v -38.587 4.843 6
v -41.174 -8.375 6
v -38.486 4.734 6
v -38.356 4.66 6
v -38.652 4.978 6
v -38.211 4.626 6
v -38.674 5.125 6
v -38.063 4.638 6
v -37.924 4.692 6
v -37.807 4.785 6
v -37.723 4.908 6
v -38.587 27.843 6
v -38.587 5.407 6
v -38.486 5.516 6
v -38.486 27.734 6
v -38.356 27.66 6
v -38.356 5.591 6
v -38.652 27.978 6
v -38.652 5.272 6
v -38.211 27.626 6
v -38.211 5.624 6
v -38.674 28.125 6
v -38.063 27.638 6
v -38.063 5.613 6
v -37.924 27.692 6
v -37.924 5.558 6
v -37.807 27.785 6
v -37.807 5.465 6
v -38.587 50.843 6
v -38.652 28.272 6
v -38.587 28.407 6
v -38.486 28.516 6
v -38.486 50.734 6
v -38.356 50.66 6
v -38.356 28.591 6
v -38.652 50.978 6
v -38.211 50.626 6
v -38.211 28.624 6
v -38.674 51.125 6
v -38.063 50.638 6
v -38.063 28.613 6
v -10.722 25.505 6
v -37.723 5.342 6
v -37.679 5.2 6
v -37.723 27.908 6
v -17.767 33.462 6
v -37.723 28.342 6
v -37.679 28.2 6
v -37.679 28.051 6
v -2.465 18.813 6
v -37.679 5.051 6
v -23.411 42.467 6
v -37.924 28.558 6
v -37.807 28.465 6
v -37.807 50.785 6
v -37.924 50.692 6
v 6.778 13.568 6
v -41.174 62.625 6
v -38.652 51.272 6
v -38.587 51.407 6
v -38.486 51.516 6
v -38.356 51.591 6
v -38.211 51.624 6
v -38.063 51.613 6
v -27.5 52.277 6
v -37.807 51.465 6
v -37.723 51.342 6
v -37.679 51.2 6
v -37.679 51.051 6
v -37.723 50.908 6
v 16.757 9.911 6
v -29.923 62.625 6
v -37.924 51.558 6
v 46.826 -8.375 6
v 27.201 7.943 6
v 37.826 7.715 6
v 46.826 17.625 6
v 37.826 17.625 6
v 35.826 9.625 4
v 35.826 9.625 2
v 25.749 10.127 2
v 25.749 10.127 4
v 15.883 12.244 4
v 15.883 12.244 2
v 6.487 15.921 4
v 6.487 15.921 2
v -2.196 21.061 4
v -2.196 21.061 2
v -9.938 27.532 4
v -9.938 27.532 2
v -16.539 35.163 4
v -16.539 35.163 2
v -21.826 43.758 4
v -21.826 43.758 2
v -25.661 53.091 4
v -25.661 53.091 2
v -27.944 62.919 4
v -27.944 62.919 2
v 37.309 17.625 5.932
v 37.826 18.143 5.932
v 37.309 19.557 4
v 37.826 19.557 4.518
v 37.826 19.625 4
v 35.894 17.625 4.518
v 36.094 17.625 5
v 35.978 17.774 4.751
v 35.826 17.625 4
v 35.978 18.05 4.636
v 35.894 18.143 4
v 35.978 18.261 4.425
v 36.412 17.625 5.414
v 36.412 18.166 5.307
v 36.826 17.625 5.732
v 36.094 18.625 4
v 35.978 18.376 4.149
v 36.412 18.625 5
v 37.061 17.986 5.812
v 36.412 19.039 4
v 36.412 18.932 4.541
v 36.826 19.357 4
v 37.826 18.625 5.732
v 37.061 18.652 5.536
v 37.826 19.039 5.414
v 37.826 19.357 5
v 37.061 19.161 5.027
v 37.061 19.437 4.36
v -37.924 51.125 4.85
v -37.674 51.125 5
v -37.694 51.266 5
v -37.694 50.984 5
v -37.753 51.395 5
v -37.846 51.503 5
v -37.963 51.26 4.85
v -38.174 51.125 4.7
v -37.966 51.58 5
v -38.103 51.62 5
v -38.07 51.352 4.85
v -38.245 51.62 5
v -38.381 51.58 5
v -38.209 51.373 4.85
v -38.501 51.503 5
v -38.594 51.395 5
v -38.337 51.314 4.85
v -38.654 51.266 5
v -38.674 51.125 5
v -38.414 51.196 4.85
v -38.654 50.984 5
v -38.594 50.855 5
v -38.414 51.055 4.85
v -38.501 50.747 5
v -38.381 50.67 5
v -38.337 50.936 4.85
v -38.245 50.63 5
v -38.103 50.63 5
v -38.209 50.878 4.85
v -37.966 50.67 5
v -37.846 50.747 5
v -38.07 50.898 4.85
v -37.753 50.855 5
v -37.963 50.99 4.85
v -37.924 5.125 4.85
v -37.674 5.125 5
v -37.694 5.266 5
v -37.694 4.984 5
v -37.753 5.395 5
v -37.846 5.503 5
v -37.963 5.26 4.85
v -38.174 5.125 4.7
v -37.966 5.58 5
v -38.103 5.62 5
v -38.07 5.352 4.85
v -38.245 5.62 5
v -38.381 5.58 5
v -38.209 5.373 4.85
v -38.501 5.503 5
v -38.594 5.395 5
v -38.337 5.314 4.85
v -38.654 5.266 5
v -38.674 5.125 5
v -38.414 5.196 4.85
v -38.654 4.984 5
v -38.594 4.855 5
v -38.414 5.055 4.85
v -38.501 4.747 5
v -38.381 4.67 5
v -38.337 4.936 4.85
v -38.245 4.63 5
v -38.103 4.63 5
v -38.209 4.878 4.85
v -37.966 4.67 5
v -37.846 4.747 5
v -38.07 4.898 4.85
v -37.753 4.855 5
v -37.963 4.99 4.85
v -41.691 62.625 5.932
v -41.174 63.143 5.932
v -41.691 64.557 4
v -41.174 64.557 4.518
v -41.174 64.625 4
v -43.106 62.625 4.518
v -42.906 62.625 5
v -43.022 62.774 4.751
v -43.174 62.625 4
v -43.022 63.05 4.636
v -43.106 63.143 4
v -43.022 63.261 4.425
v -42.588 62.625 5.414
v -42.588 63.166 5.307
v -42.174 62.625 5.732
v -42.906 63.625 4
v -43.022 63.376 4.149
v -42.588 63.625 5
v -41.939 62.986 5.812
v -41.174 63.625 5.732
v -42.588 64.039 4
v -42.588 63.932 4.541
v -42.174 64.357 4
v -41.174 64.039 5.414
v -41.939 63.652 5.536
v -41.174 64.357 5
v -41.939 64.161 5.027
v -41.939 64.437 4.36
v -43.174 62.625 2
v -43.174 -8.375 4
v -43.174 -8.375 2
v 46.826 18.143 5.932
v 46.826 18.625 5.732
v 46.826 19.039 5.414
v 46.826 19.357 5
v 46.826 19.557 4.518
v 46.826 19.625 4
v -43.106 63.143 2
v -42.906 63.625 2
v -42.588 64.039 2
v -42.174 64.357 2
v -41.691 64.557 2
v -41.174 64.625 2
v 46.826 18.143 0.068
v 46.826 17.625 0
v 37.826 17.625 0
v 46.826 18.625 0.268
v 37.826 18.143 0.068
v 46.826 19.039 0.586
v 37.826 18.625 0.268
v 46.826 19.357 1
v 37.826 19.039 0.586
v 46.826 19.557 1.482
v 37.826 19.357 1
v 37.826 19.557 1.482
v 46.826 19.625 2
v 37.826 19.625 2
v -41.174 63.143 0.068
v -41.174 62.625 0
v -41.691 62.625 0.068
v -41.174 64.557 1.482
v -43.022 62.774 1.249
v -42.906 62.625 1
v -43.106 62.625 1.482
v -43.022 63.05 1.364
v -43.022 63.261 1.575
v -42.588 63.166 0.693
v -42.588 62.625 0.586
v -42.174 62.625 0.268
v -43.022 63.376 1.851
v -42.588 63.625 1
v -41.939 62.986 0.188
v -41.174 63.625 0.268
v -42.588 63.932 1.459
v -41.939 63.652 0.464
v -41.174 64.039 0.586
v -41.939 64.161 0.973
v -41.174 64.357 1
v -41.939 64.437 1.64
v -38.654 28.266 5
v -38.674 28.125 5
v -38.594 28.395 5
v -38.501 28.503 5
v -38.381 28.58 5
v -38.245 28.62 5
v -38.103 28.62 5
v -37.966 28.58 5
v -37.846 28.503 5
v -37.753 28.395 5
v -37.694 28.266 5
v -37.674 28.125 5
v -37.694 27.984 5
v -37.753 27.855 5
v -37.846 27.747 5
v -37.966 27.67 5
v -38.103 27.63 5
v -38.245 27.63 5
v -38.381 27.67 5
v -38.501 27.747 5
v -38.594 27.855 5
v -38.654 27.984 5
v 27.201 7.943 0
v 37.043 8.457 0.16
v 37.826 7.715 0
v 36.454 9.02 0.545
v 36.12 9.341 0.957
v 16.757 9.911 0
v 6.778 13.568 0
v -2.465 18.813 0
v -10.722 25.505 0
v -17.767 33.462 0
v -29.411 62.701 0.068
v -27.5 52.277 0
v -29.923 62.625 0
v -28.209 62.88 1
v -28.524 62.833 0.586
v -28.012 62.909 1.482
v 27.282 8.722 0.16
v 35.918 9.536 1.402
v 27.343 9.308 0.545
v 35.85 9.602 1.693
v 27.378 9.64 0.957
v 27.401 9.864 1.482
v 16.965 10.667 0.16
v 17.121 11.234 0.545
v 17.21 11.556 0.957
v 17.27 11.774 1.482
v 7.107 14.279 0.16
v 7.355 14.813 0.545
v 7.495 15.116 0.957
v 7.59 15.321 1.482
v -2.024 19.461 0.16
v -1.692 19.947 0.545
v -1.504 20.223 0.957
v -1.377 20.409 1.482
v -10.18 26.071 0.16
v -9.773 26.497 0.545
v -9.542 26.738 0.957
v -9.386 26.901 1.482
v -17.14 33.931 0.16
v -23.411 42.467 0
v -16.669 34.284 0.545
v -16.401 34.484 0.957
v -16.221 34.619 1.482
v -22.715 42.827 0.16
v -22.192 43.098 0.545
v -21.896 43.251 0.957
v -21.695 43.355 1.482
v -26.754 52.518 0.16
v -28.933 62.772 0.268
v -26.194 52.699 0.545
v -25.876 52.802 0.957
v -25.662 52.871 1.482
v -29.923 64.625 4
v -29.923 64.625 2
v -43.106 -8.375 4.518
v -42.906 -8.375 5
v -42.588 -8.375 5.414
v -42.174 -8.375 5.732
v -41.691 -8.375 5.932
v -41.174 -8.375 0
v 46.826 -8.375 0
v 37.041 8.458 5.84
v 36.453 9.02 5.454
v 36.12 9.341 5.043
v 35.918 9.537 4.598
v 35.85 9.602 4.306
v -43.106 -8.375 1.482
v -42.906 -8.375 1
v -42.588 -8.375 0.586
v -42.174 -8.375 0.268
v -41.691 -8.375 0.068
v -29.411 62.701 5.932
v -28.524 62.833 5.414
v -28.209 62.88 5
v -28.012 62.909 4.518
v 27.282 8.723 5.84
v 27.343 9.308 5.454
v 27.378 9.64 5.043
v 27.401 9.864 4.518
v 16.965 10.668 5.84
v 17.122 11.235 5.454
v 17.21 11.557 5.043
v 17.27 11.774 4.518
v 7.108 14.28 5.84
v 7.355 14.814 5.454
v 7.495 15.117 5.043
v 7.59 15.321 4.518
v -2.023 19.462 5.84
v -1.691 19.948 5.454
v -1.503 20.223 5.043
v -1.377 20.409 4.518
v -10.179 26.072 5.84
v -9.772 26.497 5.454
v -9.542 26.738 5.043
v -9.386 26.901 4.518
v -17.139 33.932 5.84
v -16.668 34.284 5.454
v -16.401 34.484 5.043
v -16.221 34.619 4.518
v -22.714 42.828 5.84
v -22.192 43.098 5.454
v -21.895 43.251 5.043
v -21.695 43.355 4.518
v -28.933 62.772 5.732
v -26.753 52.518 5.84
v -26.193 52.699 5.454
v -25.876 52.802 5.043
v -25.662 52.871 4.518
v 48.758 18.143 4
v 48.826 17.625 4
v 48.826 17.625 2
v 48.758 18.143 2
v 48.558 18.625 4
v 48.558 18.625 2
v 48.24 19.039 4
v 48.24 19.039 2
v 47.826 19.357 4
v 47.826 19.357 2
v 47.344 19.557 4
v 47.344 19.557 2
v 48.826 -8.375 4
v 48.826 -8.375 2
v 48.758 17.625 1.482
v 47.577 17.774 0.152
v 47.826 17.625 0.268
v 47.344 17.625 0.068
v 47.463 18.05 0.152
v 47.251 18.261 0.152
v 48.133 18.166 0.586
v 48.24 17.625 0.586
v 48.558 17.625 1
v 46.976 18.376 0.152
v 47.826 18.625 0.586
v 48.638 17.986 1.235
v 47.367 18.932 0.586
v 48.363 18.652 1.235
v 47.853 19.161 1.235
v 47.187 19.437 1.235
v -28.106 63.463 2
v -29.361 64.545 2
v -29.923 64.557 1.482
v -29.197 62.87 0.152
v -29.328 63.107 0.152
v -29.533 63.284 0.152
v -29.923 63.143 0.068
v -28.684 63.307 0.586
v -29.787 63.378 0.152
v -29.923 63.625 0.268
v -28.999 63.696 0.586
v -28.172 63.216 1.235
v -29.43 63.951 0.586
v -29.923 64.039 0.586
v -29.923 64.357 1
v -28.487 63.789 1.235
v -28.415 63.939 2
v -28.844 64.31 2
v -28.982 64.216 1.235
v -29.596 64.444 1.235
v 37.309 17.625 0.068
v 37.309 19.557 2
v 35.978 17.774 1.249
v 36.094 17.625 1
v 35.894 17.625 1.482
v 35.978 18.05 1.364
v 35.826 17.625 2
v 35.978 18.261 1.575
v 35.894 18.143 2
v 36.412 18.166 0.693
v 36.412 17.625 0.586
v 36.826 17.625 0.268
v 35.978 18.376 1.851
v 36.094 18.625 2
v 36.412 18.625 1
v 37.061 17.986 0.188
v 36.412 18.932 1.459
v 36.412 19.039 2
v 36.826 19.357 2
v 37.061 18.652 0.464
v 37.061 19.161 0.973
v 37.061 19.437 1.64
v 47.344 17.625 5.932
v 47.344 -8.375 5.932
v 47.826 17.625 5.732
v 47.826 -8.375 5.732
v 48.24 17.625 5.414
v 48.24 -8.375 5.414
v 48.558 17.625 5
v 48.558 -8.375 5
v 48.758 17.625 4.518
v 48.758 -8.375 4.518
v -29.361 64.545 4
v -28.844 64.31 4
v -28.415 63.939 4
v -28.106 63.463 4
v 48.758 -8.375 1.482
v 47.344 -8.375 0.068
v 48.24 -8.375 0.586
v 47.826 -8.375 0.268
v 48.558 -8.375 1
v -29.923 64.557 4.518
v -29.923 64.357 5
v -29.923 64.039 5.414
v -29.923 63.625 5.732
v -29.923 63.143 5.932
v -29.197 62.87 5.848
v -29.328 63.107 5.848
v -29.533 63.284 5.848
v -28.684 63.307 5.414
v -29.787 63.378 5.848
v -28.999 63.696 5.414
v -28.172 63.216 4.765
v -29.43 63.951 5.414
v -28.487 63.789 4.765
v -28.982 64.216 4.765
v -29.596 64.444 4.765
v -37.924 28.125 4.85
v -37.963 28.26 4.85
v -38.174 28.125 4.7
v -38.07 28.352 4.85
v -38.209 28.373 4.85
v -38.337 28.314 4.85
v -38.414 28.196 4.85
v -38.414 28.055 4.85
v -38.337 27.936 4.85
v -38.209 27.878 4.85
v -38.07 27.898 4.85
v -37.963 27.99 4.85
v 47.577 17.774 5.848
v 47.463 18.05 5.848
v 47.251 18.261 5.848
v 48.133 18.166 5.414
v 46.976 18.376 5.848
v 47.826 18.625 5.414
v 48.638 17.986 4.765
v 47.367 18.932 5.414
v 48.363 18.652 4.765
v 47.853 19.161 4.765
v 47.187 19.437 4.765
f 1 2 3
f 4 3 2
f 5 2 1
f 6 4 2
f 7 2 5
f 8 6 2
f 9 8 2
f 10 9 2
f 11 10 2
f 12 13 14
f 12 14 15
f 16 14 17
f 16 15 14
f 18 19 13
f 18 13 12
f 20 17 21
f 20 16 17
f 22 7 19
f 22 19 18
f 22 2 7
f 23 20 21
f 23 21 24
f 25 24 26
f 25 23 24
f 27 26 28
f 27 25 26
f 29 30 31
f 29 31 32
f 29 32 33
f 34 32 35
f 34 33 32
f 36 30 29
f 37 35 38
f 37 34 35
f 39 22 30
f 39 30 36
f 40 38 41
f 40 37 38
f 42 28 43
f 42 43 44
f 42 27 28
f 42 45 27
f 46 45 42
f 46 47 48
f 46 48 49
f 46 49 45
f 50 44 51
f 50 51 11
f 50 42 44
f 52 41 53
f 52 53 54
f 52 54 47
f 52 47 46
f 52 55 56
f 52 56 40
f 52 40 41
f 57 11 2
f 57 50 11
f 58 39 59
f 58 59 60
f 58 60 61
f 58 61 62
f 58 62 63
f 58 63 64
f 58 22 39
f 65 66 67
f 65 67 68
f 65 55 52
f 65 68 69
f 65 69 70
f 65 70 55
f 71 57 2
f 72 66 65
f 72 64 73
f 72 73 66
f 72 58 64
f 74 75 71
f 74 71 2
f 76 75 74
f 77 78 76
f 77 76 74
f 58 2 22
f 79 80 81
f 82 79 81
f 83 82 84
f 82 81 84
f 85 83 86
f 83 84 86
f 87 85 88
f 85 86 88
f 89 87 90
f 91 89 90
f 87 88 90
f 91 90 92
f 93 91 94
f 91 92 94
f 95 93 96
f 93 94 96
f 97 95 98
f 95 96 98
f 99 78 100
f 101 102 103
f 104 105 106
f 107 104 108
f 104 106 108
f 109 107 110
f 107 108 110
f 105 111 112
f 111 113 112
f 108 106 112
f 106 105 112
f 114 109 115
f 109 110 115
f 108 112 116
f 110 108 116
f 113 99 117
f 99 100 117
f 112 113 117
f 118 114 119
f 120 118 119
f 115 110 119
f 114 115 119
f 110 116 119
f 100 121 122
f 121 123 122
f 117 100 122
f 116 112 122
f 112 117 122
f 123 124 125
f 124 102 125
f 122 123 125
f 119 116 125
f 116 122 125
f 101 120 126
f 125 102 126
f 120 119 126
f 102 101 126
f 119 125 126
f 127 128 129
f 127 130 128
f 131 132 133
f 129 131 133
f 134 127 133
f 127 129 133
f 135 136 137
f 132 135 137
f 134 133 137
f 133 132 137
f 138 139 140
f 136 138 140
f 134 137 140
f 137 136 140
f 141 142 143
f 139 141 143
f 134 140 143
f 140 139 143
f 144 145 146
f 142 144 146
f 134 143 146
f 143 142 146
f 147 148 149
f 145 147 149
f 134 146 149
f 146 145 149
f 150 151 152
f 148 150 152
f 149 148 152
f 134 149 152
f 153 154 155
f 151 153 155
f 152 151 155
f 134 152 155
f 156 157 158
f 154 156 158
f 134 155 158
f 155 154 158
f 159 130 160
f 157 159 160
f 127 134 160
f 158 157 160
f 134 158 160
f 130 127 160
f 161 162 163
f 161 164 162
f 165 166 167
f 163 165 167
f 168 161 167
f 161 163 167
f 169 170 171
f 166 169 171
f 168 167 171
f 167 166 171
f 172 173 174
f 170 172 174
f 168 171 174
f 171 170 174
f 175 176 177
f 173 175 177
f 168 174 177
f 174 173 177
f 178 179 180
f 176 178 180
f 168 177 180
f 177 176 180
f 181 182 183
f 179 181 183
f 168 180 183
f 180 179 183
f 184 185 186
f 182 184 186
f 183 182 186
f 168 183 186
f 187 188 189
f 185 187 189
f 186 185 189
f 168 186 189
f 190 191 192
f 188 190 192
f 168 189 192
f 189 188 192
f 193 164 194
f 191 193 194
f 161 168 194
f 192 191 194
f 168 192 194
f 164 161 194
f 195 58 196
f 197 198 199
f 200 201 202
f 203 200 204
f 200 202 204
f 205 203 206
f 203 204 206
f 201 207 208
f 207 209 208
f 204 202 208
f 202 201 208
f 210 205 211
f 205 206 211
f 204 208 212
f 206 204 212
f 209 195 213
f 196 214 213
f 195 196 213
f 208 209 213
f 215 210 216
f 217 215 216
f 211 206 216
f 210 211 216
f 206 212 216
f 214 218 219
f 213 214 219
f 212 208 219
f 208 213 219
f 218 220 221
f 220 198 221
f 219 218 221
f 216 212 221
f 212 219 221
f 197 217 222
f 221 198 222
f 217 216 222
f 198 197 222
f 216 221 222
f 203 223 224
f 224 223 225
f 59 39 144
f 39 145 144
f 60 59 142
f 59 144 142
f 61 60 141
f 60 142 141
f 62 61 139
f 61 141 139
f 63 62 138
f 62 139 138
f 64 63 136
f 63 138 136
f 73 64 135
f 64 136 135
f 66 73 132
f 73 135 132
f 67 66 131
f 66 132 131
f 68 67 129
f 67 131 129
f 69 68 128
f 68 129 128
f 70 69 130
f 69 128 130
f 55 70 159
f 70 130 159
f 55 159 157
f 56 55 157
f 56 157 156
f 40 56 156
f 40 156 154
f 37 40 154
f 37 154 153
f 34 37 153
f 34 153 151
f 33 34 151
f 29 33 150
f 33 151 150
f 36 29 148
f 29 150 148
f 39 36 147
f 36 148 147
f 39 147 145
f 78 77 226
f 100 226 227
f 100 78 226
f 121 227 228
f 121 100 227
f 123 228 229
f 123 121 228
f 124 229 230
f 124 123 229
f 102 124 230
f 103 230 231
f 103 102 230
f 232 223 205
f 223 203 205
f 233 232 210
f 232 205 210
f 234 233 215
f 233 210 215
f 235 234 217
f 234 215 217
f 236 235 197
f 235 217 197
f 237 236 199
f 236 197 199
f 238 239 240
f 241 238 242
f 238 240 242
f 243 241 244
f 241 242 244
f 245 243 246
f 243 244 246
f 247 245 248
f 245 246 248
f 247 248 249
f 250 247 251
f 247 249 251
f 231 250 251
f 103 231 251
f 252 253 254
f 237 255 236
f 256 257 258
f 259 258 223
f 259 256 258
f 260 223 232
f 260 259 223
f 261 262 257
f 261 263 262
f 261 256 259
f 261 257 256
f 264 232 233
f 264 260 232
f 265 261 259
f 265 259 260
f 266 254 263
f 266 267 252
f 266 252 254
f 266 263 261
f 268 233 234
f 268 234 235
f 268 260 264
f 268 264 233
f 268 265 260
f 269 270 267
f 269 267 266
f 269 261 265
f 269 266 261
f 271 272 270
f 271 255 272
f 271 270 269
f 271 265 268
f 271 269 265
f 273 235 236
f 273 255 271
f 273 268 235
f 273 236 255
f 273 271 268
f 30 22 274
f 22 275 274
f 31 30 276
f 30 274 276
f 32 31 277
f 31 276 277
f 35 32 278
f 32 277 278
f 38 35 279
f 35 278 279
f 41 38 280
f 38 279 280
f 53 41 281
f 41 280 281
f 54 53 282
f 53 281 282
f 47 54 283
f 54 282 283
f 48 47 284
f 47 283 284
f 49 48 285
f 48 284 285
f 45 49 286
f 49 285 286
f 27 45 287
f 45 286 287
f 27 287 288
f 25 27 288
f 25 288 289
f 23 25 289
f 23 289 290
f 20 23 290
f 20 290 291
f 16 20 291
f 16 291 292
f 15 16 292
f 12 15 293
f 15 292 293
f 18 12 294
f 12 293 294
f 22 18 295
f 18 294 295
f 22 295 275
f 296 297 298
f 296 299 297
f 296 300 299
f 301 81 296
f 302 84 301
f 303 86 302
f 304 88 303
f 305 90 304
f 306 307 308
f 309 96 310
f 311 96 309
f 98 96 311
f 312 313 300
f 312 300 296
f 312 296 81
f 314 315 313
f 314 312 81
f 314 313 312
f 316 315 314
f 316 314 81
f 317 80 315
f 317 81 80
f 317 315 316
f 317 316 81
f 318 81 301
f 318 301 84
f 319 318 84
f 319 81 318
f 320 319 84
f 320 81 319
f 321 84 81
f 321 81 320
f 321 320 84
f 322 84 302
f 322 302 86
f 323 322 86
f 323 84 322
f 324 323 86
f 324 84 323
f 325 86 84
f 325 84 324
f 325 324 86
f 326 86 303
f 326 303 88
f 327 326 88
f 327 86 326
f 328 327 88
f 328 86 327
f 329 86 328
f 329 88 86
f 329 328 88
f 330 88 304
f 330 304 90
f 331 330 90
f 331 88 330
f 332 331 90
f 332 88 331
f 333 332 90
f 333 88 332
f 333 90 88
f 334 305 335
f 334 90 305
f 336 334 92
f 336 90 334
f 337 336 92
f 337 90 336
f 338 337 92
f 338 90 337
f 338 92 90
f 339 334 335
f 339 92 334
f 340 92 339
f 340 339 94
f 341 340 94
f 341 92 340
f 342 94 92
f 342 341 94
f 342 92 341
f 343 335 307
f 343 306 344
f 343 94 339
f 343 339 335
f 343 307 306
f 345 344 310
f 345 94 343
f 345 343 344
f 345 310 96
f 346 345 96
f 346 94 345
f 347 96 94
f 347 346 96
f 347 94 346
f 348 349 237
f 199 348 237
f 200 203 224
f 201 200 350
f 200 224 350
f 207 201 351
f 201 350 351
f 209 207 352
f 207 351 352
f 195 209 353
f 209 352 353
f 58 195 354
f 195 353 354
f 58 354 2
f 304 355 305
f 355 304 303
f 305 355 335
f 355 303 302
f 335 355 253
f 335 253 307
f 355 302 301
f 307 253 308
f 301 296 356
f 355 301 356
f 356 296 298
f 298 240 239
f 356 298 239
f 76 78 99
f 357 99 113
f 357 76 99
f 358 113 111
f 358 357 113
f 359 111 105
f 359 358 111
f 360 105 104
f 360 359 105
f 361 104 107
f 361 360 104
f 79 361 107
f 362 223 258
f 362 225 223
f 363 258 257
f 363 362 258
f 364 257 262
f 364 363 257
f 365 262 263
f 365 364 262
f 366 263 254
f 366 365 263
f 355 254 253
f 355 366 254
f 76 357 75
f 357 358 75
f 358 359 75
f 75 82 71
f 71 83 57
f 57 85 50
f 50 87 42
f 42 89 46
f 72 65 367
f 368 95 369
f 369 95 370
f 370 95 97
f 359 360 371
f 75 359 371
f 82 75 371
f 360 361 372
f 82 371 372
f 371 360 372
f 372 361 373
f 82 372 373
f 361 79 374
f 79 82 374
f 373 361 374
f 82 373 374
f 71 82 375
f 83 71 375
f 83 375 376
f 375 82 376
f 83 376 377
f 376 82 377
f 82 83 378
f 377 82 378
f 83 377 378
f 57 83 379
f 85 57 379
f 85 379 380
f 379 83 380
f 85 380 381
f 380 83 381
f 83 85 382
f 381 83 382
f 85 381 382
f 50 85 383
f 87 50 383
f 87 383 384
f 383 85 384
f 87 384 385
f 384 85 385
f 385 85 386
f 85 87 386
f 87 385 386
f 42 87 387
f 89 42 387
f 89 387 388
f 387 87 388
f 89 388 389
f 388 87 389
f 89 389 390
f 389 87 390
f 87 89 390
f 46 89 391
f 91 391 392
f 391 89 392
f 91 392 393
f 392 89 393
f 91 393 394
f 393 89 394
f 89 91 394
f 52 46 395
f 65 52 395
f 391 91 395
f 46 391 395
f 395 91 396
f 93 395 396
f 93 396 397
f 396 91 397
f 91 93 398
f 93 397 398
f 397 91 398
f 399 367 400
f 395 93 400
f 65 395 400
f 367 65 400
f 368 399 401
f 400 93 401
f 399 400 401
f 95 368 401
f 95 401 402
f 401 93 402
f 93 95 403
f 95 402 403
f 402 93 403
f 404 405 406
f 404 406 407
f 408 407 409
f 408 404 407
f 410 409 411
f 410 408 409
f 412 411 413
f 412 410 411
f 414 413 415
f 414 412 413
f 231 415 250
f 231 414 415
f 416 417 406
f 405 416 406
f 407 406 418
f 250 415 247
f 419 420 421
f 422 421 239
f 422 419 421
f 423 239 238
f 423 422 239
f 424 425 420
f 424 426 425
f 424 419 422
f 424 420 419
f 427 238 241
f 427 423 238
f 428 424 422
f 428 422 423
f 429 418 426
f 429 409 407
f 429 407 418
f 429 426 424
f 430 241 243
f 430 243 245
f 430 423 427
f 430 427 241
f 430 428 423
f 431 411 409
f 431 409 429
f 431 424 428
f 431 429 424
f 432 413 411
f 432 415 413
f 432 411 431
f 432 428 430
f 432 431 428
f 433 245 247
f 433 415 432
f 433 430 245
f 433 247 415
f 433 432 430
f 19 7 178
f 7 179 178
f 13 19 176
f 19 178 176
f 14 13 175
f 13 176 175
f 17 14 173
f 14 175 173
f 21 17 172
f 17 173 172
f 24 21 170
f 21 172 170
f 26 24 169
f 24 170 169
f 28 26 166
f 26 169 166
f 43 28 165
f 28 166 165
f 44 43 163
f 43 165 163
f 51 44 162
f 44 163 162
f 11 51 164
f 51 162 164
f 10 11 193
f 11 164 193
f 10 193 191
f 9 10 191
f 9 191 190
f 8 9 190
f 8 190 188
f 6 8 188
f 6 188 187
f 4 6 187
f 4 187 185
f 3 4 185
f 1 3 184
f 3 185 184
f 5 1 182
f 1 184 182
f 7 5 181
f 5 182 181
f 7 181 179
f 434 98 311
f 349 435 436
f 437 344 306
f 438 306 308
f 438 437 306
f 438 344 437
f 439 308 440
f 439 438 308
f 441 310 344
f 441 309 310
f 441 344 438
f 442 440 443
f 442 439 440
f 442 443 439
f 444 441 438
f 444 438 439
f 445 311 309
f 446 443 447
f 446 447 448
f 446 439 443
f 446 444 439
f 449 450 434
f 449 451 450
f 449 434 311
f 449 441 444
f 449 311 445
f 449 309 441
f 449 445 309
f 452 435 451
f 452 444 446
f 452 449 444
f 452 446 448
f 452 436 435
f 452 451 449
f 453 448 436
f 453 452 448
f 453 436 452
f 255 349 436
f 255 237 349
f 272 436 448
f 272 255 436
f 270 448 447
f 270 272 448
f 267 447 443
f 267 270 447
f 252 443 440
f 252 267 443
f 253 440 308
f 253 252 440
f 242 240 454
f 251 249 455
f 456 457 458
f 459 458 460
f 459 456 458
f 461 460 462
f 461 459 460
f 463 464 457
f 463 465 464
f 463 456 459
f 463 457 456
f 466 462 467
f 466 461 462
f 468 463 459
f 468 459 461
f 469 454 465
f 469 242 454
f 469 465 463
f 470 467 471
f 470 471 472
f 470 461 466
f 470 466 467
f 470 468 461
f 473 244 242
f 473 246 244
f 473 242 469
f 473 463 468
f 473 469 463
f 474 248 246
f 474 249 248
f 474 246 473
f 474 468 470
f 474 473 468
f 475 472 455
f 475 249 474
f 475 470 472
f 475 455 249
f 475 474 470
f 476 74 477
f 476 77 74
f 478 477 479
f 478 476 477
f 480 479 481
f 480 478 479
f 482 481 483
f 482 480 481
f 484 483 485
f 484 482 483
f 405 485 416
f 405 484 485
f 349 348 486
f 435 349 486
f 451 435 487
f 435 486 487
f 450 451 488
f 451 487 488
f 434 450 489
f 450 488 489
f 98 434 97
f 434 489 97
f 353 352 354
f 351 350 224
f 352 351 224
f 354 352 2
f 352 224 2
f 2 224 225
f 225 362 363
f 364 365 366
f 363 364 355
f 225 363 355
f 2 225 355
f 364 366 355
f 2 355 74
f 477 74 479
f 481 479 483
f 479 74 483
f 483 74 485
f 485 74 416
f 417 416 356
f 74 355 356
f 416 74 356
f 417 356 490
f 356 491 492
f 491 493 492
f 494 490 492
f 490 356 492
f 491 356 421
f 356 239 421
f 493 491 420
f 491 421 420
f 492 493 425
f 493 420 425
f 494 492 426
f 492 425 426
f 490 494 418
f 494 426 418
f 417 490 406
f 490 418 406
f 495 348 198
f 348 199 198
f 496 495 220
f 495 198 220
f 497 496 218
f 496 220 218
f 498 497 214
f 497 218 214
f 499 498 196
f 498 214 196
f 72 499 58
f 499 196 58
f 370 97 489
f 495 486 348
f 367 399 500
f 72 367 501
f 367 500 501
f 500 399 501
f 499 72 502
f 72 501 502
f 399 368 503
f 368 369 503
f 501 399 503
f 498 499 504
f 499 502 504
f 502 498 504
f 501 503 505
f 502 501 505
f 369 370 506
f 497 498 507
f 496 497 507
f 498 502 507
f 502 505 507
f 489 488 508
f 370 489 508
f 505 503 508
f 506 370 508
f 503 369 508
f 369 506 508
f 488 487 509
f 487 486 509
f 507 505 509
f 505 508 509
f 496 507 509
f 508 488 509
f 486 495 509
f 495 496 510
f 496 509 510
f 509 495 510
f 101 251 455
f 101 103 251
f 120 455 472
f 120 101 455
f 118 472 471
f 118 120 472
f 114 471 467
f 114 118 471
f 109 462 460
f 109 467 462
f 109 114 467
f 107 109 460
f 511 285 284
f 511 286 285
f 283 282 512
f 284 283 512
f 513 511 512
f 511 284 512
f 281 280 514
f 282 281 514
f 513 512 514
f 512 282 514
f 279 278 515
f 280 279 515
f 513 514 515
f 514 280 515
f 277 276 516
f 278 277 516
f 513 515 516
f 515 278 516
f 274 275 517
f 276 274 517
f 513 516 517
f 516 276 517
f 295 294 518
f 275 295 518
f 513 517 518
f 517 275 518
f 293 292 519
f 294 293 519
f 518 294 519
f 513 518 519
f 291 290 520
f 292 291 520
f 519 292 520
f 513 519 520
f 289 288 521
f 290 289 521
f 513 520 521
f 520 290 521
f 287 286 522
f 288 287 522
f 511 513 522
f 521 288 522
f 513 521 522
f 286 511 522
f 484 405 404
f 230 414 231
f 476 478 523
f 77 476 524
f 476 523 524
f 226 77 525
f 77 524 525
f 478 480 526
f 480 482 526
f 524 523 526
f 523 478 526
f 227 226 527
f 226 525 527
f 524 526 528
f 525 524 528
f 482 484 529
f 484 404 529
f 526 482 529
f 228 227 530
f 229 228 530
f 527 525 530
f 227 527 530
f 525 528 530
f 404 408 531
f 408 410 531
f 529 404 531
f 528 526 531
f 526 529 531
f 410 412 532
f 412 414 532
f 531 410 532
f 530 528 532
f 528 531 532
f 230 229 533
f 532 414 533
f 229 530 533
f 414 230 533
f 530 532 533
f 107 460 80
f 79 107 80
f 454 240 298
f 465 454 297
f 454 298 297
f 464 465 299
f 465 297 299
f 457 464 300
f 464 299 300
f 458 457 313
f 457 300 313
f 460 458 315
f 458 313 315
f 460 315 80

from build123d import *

# Parameters (mm, degrees)
F1_DEPTH = 6
F3_D     = 1
F3_DEPTH = 1
F3_TIP   = 0.3004303095
F4_R     = 2


with BuildPart() as f1:
    # F0 (on Top) → F1 (new body)
    with BuildSketch(Plane.XY):
        with BuildLine():
            Line((-43.1737847788, 64.6250816927), (-43.1737847788, -8.3749183073))
            Line((-43.1737847788, -8.3749183073), (48.8262152212, -8.3749183073))
            Line((48.8262152212, -8.3749183073), (48.8262152212, 19.6250816927))
            Line((48.8262152212, 19.6250816927), (35.8262152212, 19.6250816927))
            Line((35.8262152212, 19.6250816927), (35.8262152212, 9.6250816927))
            ThreePointArc((35.8262152212, 9.6250816927), (-6.8545907303, 24.6965074946), (-28.1737847788, 64.6250816927))
            Line((-28.1737847788, 64.6250816927), (-43.1737847788, 64.6250816927))
        make_face()
    extrude(amount=F1_DEPTH)

    # F3
    with Locations(Plane.XY.offset(6)):
        with Locations((-38.1737847788, 51.1250816927), (-38.1737847788, 28.1250816927), (-38.1737847788, 5.1250816927)):
            Hole(F3_D / 2, depth=F3_DEPTH)
            with Locations((0, 0, -(F3_DEPTH + F3_TIP / 2))):  # 118° drill point
                Cone(0, F3_D / 2, F3_TIP, mode=Mode.SUBTRACT)

    # F4
    f4_edges = [f1.edges().sort_by_distance(p)[0] for p in [
        (48.826215, 19.625082, 3),
        (48.826215, 5.625082, 0),
        (48.826215, 5.625082, 6),
        (42.326215, 19.625082, 6),
        (42.326215, 19.625082, 0),
        (35.826215, 14.625082, 6),
        (-6.854591, 24.696507, 6),
        (35.826215, 14.625082, 0),
        (-6.854591, 24.696507, 0),
        (-35.673785, 64.625082, 0),
        (-35.673785, 64.625082, 6),
        (-43.173785, 28.125082, 0),
        (-43.173785, 28.125082, 6),
        (35.826215, 19.625082, 3),
        (-28.173785, 64.625082, 3),
        (-43.173785, 64.625082, 3),
    ]]
    fillet(f4_edges, radius=F4_R)


solid = f1.part
